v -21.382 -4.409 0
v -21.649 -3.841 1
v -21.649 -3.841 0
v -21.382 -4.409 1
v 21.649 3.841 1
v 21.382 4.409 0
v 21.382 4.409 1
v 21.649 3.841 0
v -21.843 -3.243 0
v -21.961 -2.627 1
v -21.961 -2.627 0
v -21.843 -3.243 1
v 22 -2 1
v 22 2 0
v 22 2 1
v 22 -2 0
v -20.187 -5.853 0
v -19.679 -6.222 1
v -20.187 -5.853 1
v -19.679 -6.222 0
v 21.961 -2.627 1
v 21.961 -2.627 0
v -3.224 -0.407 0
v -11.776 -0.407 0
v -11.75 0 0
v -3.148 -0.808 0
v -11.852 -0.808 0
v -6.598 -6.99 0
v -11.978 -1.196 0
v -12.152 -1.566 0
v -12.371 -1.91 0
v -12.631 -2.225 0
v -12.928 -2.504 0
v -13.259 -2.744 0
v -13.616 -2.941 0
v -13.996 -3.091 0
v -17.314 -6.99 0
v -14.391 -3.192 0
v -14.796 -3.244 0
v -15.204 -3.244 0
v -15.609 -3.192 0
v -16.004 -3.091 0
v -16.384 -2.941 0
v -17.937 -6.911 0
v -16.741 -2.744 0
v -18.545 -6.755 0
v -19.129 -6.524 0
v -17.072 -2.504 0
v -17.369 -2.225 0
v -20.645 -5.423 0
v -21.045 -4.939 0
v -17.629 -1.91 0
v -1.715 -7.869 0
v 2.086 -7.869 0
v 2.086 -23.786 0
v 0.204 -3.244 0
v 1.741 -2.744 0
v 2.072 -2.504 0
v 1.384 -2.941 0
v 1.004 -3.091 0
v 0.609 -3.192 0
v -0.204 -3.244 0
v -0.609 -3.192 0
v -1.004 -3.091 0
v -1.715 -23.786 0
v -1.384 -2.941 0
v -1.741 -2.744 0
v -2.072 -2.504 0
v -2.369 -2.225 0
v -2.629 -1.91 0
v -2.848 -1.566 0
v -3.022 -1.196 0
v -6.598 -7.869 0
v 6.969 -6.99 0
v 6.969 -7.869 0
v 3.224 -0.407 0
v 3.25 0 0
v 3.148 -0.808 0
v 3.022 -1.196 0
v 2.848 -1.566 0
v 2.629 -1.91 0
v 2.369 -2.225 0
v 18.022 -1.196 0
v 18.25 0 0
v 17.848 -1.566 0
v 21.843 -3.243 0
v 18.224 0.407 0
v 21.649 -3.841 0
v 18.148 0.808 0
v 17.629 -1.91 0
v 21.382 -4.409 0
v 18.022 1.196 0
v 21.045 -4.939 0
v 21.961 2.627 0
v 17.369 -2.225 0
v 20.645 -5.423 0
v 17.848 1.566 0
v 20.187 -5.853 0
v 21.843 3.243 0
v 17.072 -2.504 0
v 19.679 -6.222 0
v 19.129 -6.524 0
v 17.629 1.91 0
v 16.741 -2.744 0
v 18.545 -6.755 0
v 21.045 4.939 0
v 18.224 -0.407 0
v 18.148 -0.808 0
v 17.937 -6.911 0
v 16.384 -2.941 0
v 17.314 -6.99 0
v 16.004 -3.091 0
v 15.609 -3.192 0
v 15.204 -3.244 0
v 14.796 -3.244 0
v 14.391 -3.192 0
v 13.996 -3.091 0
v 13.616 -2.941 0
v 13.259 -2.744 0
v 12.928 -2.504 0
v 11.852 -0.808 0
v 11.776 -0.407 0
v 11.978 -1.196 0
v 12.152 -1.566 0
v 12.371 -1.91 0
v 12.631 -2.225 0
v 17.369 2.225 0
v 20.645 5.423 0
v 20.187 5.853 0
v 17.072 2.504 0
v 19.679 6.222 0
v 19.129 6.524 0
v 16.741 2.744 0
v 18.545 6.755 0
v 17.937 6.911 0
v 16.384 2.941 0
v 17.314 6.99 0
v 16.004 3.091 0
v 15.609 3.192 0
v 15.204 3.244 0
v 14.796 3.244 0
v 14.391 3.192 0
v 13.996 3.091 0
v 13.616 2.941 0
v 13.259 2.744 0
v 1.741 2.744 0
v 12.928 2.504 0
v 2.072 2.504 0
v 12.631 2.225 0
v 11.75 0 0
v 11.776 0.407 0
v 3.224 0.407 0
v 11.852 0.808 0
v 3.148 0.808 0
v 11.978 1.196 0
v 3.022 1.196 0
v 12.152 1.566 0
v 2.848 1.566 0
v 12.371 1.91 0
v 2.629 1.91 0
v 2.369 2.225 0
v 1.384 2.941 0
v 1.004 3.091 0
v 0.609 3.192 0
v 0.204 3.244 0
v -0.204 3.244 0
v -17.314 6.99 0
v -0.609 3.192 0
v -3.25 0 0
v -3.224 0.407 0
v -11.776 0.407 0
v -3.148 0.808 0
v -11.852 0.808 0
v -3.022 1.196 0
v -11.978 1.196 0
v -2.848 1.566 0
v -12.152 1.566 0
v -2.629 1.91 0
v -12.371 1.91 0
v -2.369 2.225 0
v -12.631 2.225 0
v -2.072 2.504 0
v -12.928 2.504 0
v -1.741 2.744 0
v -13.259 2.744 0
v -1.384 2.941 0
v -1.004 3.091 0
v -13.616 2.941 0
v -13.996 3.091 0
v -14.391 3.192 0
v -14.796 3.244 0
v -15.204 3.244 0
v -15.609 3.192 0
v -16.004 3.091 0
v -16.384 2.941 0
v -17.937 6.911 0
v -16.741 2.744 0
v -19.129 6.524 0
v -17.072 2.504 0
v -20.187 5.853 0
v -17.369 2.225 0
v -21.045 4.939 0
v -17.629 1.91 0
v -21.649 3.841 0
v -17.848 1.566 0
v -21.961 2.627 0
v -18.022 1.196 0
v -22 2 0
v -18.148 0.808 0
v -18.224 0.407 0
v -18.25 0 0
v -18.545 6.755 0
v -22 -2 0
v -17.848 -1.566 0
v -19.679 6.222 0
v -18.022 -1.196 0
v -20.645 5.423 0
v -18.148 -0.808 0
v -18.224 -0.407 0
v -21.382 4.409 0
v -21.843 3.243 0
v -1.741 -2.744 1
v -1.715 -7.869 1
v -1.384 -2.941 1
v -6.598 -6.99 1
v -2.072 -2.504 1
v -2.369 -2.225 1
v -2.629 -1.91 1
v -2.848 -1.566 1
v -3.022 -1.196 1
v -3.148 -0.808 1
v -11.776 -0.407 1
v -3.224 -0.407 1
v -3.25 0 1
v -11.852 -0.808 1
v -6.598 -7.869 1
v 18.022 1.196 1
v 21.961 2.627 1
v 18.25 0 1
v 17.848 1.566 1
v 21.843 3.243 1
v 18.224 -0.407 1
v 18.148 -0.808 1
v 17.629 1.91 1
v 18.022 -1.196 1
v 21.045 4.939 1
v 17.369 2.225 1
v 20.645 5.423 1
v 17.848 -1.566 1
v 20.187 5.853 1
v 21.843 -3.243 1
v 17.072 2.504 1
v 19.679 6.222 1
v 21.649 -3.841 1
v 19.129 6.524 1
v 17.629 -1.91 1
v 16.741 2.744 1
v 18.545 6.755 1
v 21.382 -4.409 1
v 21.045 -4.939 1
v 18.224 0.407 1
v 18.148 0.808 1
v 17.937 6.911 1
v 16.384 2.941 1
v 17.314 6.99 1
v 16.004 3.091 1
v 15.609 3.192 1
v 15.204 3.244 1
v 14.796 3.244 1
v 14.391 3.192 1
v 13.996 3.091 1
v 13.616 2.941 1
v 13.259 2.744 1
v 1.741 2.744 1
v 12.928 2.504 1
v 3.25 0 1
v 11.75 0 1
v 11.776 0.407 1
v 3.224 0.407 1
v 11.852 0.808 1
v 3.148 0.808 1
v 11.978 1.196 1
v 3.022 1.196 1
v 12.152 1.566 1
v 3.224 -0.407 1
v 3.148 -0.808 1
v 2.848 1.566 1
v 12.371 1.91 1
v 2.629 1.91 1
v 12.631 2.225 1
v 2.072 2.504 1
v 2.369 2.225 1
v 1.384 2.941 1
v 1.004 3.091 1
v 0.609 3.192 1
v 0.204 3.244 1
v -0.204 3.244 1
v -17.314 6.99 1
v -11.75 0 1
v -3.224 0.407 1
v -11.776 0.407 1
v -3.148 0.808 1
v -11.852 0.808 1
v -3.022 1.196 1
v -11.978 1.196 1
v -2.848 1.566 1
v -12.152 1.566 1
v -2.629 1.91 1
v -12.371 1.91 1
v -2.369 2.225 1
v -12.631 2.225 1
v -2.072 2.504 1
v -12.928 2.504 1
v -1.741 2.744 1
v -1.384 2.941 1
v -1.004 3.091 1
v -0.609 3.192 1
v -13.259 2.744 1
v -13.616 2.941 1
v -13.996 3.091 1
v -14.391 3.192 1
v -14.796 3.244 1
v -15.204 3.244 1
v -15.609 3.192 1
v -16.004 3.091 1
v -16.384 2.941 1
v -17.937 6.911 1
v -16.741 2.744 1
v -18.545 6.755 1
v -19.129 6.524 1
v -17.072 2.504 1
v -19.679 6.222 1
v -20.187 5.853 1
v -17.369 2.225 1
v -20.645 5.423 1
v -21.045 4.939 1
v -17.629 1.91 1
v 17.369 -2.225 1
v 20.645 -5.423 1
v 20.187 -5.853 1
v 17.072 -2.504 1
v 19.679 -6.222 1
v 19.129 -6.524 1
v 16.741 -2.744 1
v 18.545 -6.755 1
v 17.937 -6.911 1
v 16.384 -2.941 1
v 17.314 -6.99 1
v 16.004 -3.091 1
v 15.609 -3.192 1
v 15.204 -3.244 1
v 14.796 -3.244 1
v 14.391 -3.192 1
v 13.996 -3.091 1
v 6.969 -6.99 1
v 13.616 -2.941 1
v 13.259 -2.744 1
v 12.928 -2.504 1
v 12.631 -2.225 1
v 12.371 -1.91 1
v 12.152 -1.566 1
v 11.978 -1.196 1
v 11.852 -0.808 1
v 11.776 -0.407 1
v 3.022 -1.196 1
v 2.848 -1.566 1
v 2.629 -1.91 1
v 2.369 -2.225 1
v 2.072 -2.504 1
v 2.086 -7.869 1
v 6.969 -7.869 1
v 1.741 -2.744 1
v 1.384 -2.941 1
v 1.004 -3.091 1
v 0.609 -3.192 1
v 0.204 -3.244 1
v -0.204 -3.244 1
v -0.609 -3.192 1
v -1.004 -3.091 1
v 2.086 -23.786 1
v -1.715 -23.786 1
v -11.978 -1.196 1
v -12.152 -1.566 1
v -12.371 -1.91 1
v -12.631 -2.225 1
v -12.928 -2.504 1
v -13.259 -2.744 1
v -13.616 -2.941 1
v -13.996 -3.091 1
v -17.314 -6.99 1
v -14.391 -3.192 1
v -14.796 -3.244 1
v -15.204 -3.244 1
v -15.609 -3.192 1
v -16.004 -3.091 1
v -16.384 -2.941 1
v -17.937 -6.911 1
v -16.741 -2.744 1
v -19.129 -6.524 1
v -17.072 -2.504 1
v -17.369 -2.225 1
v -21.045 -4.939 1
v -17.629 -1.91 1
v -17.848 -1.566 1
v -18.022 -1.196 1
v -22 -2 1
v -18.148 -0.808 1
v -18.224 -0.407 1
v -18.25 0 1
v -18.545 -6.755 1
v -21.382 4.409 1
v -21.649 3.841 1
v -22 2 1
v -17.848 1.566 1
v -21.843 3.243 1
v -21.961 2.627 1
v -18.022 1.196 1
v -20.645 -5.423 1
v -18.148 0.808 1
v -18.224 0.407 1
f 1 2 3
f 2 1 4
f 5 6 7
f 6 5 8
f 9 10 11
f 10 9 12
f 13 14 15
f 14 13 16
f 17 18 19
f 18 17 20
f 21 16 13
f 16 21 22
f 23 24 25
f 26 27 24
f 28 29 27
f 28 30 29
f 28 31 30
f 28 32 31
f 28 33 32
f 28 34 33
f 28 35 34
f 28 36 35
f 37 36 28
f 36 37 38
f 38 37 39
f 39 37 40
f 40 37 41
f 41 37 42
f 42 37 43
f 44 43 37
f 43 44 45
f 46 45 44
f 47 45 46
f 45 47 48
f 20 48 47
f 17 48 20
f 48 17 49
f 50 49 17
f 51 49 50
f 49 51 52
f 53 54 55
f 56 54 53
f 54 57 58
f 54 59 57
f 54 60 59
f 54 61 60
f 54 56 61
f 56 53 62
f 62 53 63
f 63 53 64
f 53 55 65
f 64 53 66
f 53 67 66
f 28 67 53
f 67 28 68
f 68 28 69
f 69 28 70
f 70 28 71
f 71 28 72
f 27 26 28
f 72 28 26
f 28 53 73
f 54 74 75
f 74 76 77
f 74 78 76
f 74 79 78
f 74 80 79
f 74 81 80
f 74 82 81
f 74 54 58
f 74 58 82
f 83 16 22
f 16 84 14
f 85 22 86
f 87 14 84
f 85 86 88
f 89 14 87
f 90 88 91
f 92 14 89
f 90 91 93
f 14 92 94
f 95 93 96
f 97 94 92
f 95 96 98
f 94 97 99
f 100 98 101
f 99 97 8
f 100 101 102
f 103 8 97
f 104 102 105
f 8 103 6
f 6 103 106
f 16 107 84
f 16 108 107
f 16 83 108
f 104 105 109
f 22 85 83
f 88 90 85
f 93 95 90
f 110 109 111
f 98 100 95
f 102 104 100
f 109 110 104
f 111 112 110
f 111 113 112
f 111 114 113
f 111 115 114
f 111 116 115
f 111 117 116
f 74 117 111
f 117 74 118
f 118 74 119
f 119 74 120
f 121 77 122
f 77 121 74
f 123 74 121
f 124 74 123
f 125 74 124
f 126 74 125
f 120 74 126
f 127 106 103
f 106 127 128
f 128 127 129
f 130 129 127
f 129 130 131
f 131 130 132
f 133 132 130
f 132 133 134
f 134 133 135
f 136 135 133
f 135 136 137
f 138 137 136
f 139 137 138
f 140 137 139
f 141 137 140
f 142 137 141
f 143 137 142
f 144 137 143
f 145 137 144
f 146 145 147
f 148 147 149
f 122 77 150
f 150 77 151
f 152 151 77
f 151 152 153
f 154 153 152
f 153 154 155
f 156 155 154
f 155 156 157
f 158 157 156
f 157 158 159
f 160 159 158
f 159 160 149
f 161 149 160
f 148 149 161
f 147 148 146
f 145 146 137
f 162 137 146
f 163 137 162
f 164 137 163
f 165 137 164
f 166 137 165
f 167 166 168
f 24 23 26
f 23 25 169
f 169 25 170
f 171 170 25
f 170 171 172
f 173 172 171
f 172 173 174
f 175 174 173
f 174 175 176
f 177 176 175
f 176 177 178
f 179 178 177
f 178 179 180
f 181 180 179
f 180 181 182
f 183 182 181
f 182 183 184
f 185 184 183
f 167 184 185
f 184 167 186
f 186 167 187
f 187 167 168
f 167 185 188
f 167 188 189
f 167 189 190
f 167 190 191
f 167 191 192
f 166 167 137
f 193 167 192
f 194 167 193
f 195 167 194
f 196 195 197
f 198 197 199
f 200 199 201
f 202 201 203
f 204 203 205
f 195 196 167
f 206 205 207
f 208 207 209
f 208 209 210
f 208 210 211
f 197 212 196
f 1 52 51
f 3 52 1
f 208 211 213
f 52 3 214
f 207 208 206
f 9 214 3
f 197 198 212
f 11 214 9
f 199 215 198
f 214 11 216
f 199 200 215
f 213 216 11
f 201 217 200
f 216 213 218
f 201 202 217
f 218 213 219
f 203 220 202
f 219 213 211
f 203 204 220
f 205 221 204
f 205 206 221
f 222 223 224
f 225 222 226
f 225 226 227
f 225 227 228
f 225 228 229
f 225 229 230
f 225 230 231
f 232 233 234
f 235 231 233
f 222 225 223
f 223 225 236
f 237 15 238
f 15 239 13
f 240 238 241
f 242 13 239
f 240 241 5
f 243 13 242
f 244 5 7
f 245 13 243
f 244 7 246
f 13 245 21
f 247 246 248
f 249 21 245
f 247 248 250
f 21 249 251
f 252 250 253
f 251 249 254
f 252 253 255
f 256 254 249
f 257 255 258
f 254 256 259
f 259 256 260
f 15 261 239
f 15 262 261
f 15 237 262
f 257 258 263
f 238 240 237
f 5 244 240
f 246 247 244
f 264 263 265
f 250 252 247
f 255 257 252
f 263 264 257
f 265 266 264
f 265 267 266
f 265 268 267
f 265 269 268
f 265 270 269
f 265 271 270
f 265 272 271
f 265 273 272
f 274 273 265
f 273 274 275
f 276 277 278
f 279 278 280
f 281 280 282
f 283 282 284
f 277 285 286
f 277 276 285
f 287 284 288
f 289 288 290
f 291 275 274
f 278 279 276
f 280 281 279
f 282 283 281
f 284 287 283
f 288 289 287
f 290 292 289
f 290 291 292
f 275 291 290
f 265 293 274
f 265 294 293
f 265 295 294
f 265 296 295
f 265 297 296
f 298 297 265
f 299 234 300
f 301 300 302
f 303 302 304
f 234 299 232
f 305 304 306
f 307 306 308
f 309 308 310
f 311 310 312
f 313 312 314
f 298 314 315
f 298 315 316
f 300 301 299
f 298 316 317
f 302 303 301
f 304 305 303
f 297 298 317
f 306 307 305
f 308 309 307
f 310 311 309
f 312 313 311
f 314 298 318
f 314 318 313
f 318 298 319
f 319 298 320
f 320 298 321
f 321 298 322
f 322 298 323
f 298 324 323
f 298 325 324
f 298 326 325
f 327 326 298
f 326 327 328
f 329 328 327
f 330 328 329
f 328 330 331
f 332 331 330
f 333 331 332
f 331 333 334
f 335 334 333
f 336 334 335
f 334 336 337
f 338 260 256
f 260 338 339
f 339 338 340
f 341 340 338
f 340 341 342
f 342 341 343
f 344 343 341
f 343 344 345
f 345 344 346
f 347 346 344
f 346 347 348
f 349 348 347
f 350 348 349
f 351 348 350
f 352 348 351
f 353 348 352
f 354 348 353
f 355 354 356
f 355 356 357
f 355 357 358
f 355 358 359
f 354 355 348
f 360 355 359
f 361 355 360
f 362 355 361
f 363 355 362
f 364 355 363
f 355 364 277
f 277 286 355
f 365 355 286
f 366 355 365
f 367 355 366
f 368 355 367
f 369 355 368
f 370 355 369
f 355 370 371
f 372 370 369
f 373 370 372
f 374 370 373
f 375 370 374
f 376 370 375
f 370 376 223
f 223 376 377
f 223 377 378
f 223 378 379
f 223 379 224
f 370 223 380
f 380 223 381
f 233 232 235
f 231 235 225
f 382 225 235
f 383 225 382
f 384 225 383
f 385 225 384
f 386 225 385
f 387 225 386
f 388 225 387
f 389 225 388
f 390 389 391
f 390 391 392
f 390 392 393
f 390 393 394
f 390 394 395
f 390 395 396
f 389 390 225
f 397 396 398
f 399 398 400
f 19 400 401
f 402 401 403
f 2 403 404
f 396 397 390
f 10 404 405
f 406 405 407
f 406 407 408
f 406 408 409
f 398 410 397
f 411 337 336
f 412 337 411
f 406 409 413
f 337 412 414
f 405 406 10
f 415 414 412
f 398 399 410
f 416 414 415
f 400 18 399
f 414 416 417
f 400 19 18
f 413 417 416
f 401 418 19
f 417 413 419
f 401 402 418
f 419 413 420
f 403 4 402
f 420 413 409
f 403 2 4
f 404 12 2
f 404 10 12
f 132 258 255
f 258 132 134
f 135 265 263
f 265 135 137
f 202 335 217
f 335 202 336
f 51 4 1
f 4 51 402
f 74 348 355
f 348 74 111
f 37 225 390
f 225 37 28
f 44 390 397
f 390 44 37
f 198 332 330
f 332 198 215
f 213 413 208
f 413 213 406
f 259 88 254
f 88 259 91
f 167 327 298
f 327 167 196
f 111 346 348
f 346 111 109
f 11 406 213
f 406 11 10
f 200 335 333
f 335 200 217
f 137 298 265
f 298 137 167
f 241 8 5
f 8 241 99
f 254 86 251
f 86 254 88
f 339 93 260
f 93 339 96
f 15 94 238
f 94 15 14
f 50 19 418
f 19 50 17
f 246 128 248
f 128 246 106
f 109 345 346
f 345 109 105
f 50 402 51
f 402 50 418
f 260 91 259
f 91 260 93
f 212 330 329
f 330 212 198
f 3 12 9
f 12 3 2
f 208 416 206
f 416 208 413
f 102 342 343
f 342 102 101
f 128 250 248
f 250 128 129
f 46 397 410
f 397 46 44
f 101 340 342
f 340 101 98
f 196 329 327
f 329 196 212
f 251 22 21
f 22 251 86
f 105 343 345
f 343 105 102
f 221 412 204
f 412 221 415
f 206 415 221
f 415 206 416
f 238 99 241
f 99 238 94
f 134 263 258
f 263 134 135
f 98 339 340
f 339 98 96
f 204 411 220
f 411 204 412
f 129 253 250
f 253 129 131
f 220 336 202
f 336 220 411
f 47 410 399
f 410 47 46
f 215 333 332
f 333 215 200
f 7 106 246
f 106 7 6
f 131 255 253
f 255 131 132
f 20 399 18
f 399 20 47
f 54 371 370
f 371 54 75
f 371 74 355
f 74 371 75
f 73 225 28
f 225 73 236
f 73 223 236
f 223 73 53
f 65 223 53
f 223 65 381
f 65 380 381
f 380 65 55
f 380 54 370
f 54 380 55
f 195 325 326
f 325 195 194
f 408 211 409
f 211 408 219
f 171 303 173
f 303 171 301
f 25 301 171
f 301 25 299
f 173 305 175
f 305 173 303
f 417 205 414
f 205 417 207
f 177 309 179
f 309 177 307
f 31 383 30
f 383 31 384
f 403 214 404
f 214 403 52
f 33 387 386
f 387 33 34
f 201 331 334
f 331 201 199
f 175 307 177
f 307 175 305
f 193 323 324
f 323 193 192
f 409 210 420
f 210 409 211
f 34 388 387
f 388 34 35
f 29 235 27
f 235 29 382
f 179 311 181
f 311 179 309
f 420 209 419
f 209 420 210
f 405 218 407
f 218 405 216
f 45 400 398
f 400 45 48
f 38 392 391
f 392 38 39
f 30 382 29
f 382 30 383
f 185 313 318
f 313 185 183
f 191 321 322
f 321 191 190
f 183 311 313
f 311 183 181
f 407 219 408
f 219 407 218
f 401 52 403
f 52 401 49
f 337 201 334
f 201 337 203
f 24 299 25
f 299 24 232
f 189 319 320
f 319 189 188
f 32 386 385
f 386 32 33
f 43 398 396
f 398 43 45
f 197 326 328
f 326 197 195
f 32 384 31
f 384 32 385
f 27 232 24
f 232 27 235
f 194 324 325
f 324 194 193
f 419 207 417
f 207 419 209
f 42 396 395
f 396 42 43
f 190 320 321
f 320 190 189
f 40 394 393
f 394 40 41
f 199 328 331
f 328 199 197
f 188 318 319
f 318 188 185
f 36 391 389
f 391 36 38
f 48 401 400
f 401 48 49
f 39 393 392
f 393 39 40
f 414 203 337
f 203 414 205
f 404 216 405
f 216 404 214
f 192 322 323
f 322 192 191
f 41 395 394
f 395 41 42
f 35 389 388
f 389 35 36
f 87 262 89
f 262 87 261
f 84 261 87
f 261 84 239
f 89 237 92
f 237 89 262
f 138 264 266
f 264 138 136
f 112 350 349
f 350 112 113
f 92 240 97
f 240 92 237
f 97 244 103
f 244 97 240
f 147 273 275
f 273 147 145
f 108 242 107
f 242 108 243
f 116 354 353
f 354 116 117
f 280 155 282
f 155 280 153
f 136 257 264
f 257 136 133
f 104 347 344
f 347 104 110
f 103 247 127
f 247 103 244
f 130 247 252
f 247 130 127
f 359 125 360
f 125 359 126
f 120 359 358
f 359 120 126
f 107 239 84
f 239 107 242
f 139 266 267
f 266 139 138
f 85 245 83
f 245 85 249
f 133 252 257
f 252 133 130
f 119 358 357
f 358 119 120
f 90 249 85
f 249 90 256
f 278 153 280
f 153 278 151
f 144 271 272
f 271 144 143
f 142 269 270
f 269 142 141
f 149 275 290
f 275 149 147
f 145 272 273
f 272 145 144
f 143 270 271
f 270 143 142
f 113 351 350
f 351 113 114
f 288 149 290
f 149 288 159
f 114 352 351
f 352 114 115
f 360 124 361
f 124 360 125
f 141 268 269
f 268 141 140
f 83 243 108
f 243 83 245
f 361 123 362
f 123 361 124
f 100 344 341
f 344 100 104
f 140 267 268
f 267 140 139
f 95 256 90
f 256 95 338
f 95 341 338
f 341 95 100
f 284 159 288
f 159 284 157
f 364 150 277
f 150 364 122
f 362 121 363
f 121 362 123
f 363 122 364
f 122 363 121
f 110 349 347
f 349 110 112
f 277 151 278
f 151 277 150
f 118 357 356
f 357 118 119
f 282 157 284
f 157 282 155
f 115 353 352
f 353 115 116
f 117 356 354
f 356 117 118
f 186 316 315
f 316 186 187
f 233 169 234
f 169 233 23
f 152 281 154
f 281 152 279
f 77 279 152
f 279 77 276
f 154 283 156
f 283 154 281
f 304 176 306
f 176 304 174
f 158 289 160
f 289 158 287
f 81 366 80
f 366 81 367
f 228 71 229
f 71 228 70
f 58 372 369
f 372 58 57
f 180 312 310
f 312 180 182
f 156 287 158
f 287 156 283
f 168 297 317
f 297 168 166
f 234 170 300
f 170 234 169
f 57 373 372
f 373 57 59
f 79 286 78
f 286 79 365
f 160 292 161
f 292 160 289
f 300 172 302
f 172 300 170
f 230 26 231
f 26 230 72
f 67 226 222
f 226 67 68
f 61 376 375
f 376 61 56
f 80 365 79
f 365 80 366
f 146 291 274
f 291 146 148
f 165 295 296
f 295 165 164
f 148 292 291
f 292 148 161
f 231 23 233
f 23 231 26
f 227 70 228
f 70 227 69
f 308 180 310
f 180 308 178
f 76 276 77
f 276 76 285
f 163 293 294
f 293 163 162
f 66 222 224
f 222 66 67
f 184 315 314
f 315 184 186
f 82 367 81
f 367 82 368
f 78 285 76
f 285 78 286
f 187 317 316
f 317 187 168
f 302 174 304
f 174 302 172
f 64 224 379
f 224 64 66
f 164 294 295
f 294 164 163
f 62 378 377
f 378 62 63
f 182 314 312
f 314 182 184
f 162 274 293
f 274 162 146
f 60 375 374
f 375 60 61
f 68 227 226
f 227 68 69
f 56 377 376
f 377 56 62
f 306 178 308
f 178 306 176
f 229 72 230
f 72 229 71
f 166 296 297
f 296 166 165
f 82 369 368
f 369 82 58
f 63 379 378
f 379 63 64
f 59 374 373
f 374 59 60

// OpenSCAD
$fn = 50;


difference() {
	union() {
		translate(v = [0, 0, 0]) {
			rotate(a = [0, 0, 0]) {
				hull() {
					translate(v = [-17.0000000000, 2.0000000000, 0]) {
						rotate(a = [0, 0, 0]) {
							translate(v = [0, 0, 0]) {
								rotate(a = [0, 0, 0]) {
									cylinder(h = 1, r = 5);
								}
							}
						}
					}
					translate(v = [17.0000000000, 2.0000000000, 0]) {
						rotate(a = [0, 0, 0]) {
							translate(v = [0, 0, 0]) {
								rotate(a = [0, 0, 0]) {
									cylinder(h = 1, r = 5);
								}
							}
						}
					}
					translate(v = [-17.0000000000, -2.0000000000, 0]) {
						rotate(a = [0, 0, 0]) {
							translate(v = [0, 0, 0]) {
								rotate(a = [0, 0, 0]) {
									cylinder(h = 1, r = 5);
								}
							}
						}
					}
					translate(v = [17.0000000000, -2.0000000000, 0]) {
						rotate(a = [0, 0, 0]) {
							translate(v = [0, 0, 0]) {
								rotate(a = [0, 0, 0]) {
									cylinder(h = 1, r = 5);
								}
							}
						}
					}
				}
			}
		}
		translate(v = [0, -5, 0]) {
			rotate(a = [0, 0, 0]) {
				linear_extrude(height = 1) {
					text(font = "DejaVu Sans Mono:style=Bold", halign = "center", size = 19.0000000000, text = "T", valign = "top");
				}
			}
		}
	}
	union() {
		translate(v = [-15.0000000000, 0.0000000000, -125.0000000000]) {
			rotate(a = [0, 0, 0]) {
				cylinder(h = 250, r = 3.2500000000);
			}
		}
		translate(v = [15.0000000000, 0.0000000000, -125.0000000000]) {
			rotate(a = [0, 0, 0]) {
				cylinder(h = 250, r = 3.2500000000);
			}
		}
		translate(v = [15.0000000000, 0.0000000000, -125.0000000000]) {
			rotate(a = [0, 0, 0]) {
				cylinder(h = 250, r = 3.2500000000);
			}
		}
		translate(v = [0, 0, -125.0000000000]) {
			rotate(a = [0, 0, 0]) {
				cylinder(h = 250, r = 3.2500000000);
			}
		}
	}
}
